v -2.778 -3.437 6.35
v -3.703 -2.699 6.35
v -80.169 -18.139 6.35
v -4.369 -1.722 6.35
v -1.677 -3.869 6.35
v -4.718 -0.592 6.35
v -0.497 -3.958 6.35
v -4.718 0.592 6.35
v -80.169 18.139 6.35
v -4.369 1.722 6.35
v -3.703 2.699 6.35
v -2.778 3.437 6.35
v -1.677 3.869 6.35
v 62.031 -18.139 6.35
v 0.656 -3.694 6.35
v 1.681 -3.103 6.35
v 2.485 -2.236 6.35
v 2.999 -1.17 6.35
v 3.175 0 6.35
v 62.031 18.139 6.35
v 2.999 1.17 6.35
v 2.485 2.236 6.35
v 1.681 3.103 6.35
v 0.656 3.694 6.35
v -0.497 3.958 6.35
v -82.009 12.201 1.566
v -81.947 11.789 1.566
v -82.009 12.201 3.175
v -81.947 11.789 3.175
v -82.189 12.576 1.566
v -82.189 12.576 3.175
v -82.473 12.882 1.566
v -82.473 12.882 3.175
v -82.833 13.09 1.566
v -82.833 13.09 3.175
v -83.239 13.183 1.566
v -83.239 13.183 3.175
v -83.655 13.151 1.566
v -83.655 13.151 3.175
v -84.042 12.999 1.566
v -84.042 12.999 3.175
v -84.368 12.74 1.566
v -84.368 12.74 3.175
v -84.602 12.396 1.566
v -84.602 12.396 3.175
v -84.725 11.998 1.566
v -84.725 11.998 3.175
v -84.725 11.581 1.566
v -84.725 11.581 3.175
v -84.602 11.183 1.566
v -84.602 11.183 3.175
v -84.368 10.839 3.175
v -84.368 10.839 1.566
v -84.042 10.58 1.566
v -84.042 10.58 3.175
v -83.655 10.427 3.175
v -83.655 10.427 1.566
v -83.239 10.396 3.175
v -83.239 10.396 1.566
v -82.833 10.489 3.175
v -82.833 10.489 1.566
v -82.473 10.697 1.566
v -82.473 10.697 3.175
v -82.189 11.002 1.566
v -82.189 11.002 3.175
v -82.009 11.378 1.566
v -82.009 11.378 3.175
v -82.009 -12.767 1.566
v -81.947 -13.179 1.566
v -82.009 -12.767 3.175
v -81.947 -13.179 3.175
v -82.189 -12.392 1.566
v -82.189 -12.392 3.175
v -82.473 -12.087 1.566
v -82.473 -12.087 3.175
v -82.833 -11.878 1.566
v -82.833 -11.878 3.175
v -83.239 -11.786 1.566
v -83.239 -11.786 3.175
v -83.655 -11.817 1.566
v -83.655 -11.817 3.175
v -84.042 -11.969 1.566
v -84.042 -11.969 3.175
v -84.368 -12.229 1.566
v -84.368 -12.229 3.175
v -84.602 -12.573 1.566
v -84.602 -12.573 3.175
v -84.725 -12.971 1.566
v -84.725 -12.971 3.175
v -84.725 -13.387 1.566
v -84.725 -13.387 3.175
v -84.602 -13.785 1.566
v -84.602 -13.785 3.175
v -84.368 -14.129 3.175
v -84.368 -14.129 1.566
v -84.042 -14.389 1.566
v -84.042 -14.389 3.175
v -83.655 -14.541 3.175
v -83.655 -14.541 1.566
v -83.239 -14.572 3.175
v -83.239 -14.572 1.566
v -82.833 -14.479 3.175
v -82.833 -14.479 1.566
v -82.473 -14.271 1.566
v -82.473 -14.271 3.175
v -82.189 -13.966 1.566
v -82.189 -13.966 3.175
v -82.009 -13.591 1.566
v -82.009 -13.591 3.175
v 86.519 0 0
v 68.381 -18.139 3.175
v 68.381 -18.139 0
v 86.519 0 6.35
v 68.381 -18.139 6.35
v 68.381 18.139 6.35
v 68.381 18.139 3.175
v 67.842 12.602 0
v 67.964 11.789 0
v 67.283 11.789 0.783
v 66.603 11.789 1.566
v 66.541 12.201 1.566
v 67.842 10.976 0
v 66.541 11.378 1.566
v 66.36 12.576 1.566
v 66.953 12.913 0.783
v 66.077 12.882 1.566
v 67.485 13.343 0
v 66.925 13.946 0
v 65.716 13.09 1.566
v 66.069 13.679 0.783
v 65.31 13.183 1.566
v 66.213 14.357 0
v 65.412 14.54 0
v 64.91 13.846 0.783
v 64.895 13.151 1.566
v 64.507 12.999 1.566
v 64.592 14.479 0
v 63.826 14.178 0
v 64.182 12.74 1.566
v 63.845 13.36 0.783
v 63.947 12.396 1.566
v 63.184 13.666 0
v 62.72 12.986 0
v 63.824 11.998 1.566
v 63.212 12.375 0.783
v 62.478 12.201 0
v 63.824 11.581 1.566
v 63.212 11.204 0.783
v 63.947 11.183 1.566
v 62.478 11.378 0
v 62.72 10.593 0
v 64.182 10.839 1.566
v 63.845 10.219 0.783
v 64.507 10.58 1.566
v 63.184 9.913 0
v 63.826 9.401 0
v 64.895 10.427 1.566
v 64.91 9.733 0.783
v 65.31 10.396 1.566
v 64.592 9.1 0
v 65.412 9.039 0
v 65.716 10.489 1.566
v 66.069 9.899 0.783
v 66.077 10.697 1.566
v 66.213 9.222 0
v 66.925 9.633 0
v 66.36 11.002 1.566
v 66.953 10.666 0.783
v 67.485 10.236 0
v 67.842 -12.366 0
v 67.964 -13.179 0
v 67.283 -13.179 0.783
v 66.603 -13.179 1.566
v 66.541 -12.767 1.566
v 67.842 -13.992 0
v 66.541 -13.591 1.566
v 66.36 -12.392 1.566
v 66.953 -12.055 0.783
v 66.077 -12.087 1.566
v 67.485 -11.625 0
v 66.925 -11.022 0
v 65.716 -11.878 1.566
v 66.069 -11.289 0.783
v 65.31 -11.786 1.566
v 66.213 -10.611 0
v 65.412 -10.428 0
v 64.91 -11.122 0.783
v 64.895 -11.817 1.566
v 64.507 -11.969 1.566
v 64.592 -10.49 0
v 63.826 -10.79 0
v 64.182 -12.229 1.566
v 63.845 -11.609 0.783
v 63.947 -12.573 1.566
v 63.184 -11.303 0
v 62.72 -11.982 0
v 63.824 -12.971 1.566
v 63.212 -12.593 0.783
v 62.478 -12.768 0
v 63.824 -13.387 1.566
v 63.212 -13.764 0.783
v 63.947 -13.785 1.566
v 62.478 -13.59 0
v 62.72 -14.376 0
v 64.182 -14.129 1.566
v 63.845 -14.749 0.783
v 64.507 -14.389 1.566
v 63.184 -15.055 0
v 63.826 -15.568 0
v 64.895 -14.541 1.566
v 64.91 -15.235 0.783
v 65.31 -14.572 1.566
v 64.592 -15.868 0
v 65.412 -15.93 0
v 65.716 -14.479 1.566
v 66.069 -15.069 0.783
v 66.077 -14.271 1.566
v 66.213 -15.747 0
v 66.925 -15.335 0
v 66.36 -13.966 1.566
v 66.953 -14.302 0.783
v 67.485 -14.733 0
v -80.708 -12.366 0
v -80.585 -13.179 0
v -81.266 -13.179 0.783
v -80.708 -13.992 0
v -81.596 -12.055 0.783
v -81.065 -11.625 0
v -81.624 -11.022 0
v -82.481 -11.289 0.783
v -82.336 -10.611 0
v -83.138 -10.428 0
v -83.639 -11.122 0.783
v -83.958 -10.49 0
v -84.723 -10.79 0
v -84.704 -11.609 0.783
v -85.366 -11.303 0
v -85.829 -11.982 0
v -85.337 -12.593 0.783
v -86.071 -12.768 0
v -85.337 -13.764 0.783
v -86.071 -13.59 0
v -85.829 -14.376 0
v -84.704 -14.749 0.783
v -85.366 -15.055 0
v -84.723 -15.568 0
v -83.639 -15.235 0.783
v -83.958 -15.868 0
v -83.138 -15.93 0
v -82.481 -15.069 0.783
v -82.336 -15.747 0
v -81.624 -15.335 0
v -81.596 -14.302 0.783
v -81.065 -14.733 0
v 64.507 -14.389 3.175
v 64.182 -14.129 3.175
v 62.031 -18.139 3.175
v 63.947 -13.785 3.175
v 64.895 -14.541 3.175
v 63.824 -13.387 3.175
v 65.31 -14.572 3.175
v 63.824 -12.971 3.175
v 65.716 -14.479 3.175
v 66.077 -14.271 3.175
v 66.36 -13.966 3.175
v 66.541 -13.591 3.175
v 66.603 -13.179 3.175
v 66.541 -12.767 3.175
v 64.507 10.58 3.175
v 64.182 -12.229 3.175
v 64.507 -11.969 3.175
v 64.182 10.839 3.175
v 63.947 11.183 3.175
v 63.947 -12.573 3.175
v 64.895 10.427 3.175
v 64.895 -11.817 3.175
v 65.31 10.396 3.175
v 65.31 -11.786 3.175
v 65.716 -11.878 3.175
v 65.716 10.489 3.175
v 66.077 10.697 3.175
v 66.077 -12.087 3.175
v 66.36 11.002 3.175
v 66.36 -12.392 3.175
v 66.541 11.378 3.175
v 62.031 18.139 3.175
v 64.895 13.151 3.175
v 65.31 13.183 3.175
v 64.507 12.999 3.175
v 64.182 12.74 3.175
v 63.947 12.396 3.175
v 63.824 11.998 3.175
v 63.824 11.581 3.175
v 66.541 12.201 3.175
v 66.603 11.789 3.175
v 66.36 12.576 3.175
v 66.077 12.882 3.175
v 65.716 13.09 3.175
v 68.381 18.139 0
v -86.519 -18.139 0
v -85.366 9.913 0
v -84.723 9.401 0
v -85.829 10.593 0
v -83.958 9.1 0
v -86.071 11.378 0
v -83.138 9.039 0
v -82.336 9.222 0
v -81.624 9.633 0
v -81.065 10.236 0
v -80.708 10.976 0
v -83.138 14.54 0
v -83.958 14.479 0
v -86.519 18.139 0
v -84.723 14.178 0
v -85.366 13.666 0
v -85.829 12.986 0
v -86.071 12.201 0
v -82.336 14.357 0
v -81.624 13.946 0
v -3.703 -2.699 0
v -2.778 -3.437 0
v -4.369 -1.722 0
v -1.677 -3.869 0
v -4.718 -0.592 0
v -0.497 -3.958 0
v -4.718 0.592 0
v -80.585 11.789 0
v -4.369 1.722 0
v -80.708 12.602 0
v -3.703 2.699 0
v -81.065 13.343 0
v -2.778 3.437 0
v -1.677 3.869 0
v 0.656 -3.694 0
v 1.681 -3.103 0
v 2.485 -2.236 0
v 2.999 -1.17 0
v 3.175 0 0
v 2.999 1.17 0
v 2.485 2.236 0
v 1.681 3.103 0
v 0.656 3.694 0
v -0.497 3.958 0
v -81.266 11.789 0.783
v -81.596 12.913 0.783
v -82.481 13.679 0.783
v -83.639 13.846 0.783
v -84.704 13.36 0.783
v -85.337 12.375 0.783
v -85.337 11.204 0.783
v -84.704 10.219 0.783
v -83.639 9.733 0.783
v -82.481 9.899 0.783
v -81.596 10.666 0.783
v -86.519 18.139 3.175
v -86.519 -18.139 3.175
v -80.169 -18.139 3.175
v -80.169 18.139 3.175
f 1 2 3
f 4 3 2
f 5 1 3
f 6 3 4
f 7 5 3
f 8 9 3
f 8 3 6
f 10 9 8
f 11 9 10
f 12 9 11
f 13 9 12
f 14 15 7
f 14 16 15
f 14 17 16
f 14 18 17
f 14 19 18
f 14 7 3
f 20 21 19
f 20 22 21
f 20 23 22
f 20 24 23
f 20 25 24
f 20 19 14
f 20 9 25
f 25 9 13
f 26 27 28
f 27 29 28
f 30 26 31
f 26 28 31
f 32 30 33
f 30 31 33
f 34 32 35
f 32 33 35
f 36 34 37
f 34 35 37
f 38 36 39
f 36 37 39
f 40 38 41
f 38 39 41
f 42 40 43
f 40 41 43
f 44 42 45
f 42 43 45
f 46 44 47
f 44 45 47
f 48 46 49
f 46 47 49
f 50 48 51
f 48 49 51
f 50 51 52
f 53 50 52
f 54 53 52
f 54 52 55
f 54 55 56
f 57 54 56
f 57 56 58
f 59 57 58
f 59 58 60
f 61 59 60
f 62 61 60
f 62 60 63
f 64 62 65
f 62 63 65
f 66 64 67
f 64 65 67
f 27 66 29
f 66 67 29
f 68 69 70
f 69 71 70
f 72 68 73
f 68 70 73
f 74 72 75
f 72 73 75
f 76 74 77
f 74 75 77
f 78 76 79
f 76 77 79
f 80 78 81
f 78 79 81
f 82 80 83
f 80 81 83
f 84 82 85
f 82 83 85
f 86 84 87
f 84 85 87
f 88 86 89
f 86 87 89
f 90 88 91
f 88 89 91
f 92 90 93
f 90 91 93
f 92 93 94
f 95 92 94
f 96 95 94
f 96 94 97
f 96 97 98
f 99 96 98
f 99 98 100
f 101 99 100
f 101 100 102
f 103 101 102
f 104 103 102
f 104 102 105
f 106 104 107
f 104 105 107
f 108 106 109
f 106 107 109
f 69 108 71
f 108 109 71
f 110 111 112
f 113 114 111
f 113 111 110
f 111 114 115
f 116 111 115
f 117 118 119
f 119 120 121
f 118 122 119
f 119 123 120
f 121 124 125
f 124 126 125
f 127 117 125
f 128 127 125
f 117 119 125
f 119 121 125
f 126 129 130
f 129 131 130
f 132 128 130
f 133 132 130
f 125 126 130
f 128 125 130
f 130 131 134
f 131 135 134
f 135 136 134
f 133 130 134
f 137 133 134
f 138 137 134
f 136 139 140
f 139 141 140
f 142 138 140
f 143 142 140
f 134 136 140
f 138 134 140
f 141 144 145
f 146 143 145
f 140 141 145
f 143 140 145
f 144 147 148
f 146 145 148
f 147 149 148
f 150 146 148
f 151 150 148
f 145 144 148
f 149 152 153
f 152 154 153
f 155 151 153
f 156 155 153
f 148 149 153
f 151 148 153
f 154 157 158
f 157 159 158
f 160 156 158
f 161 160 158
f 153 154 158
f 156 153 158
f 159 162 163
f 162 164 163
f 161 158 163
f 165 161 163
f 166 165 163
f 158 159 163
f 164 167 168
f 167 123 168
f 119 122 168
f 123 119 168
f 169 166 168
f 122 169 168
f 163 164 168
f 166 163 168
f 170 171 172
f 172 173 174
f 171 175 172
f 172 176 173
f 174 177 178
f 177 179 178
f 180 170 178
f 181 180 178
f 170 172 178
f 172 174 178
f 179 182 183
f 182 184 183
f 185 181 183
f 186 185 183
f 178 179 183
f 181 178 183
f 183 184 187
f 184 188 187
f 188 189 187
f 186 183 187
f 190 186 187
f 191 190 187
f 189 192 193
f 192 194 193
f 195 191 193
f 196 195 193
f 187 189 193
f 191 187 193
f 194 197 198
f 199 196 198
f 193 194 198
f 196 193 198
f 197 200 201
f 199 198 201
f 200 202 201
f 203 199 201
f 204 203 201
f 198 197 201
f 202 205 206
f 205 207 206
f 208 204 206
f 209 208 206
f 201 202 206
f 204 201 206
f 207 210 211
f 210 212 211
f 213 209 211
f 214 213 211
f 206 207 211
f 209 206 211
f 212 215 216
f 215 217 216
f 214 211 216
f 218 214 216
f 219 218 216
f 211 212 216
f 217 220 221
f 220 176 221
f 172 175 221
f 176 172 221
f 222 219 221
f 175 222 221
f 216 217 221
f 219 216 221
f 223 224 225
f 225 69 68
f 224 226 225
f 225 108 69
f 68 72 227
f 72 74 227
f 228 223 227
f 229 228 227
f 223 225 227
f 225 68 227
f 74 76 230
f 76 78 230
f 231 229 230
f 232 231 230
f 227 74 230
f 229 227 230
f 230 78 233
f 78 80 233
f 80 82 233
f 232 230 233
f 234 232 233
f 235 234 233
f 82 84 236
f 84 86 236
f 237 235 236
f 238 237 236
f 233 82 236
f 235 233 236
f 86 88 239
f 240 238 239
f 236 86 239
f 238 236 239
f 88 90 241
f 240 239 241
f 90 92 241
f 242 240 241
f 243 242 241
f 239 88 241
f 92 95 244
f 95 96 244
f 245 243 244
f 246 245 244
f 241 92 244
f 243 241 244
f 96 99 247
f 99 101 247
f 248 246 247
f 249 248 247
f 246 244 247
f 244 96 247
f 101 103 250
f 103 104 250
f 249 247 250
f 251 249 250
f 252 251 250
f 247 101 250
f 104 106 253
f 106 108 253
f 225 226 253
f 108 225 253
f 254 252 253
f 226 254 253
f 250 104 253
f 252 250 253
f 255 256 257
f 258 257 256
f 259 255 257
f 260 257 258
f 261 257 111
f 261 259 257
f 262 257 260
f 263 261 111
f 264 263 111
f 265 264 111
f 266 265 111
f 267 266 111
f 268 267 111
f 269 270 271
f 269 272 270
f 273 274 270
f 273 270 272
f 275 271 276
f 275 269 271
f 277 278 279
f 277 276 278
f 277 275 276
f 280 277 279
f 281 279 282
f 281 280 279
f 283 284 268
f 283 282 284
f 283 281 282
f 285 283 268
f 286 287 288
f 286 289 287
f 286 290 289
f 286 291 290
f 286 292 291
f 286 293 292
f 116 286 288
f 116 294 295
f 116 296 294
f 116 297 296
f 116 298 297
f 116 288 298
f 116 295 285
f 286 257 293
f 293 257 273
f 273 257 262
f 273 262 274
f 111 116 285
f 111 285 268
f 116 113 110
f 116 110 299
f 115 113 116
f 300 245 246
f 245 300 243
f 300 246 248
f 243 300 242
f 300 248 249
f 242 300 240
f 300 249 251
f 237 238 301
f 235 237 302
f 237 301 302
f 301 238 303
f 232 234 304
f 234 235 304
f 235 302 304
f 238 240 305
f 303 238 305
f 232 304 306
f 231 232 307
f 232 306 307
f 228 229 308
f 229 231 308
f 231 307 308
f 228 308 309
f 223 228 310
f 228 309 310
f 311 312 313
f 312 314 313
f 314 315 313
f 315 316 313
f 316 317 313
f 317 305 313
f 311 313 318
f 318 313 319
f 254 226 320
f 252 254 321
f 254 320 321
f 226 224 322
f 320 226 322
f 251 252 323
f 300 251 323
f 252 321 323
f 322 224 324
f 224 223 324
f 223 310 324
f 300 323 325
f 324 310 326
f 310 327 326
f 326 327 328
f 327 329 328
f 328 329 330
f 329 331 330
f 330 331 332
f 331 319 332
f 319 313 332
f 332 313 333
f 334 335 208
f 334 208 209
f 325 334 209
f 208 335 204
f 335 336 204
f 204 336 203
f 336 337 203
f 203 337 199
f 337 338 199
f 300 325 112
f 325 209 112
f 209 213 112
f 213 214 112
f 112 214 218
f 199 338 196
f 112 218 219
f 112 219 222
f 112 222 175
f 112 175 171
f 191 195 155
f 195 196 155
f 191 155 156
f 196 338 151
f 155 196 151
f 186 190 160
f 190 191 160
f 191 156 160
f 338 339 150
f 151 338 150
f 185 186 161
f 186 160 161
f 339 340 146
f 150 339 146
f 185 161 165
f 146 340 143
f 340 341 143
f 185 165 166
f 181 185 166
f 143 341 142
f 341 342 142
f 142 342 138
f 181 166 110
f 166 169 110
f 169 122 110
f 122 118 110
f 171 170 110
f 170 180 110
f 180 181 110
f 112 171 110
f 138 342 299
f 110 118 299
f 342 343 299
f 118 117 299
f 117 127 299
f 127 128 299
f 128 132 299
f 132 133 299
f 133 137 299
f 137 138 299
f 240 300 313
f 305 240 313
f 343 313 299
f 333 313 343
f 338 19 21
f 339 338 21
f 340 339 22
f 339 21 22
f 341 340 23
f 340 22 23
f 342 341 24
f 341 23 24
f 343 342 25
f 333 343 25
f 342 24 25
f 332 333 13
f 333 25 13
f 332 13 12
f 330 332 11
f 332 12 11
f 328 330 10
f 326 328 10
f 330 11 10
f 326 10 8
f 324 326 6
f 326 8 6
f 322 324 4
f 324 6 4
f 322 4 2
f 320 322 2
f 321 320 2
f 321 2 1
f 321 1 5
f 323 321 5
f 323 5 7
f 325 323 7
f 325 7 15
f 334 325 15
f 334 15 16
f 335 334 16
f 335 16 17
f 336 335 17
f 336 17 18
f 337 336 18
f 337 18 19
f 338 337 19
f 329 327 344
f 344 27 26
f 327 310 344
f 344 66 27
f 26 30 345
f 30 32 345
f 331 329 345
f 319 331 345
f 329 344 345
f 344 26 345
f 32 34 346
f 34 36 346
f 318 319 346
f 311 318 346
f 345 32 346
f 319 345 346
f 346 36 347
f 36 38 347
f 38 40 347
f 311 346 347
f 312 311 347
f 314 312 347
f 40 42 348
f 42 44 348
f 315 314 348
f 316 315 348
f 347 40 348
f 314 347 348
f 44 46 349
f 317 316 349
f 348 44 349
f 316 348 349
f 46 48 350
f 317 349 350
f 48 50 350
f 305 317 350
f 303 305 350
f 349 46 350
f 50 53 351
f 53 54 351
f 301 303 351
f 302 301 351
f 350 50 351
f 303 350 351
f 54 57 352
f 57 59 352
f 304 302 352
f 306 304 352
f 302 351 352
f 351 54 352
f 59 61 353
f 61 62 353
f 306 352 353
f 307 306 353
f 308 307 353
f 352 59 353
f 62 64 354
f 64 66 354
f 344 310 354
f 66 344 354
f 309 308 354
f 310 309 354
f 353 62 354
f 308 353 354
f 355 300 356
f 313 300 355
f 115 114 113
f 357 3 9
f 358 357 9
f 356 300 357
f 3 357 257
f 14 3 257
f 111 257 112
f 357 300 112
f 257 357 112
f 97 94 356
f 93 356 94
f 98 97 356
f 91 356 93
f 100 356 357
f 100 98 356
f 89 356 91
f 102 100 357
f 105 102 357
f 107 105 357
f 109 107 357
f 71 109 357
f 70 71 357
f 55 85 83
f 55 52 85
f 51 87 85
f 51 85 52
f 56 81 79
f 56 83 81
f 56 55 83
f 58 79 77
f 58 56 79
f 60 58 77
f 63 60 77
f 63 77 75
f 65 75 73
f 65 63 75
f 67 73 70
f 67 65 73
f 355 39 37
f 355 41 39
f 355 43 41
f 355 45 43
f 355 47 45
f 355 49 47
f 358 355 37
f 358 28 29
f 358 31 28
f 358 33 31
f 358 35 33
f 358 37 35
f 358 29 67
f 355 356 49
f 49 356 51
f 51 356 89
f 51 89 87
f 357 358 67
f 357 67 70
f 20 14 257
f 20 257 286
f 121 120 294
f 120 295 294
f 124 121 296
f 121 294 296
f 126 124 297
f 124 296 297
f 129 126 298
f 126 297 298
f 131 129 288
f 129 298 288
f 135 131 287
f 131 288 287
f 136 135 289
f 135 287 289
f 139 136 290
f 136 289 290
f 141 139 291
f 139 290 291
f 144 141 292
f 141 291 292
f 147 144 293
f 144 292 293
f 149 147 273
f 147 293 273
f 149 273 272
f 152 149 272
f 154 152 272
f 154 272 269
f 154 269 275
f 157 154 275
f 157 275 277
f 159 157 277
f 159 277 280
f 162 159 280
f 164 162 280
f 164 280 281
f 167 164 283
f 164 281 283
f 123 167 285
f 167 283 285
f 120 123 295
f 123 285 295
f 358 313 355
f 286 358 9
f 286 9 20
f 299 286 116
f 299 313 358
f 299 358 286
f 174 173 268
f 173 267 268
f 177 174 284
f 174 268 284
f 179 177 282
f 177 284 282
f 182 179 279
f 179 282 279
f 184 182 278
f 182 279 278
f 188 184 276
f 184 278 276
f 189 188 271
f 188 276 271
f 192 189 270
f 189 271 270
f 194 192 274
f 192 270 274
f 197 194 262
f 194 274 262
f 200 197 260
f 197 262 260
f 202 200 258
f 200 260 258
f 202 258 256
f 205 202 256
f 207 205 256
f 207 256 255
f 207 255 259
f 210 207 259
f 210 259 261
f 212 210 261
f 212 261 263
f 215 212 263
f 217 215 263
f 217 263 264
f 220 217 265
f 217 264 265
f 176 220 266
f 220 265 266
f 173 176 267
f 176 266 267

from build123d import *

# Parameters (mm, degrees)
SKETCH1_W                                         = 173.0375
SKETCH1_H                                         = 36.27882
EXTRUDE2_DEPTH                                    = 6.35
SKETCH8_W                                         = 6.35
SKETCH8_H                                         = 36.27882
EXTRUDE7_DEPTH                                    = 3.175
EXTRUDE8_DEPTH                                    = 89.627618702
SKETCH19_R                                        = 3.96875
EXTRUDE9_DEPTH                                    = 89.627618702
CSK_FOR_3_FLAT_HEAD_SOCKET_CAP_SCREW1_D           = 2.794
CSK_FOR_3_FLAT_HEAD_SOCKET_CAP_SCREW1_CSINK_D     = 5.51688
CSK_FOR_3_FLAT_HEAD_SOCKET_CAP_SCREW1_CSINK_ANGLE = 82
CSK_FOR_3_FLAT_HEAD_SOCKET_CAP_SCREW2_D           = 2.794
CSK_FOR_3_FLAT_HEAD_SOCKET_CAP_SCREW2_CSINK_D     = 5.51688
CSK_FOR_3_FLAT_HEAD_SOCKET_CAP_SCREW2_CSINK_ANGLE = 82


with BuildPart() as part:
    # Sketch1 → Extrude2 (new body)
    with BuildSketch(Plane.XY):
        Rectangle(SKETCH1_W, SKETCH1_H)
    extrude(amount=EXTRUDE2_DEPTH)

    # Sketch8 → Extrude7 (cut)
    with BuildSketch(Plane.XY.offset(6.35)):
        with Locations((-83.34375, 0)):
            Rectangle(SKETCH8_W, SKETCH8_H)
        with Locations((65.20561, 0)):
            Rectangle(SKETCH8_W, SKETCH8_H)
    extrude(amount=-EXTRUDE7_DEPTH, mode=Mode.SUBTRACT)

    # Sketch18 → Extrude8 (cut, through all)
    with BuildSketch(Plane.XY.offset(6.35)):
        Polygon((86.51875, 0), (68.38061, 18.13941), (113.519162523, 18.13941), (113.519162523, -18.13941), (68.38061, -18.13941), align=None)
    extrude(amount=-EXTRUDE8_DEPTH, mode=Mode.SUBTRACT)

    # Sketch19 → Extrude9 (cut, through all)
    with BuildSketch(Plane.XY.offset(6.35)):
        with Locations((-0.79375, 0)):
            Circle(SKETCH19_R)
    extrude(amount=-EXTRUDE9_DEPTH, mode=Mode.SUBTRACT)

    # CSK for #3 Flat Head Socket Cap Screw1 (through all)
    with Locations(Plane(origin=(2.381898793, -14.071004552, 0), x_dir=(-1, 0, 0), z_dir=(0, 0, -1))):
        with Locations((-62.823711207, 25.860414552), (-62.823711207, 0.892214552)):
            CounterSinkHole(CSK_FOR_3_FLAT_HEAD_SOCKET_CAP_SCREW1_D / 2, CSK_FOR_3_FLAT_HEAD_SOCKET_CAP_SCREW1_CSINK_D / 2, counter_sink_angle=CSK_FOR_3_FLAT_HEAD_SOCKET_CAP_SCREW1_CSINK_ANGLE)

    # CSK for #3 Flat Head Socket Cap Screw2 (through all)
    with Locations(Plane(origin=(2.381898793, -14.071004552, 0), x_dir=(-1, 0, 0), z_dir=(0, 0, -1))):
        with Locations((85.725648793, 25.860414552), (85.725648793, 0.892214552)):
            CounterSinkHole(CSK_FOR_3_FLAT_HEAD_SOCKET_CAP_SCREW2_D / 2, CSK_FOR_3_FLAT_HEAD_SOCKET_CAP_SCREW2_CSINK_D / 2, counter_sink_angle=CSK_FOR_3_FLAT_HEAD_SOCKET_CAP_SCREW2_CSINK_ANGLE)


solid = part.part
